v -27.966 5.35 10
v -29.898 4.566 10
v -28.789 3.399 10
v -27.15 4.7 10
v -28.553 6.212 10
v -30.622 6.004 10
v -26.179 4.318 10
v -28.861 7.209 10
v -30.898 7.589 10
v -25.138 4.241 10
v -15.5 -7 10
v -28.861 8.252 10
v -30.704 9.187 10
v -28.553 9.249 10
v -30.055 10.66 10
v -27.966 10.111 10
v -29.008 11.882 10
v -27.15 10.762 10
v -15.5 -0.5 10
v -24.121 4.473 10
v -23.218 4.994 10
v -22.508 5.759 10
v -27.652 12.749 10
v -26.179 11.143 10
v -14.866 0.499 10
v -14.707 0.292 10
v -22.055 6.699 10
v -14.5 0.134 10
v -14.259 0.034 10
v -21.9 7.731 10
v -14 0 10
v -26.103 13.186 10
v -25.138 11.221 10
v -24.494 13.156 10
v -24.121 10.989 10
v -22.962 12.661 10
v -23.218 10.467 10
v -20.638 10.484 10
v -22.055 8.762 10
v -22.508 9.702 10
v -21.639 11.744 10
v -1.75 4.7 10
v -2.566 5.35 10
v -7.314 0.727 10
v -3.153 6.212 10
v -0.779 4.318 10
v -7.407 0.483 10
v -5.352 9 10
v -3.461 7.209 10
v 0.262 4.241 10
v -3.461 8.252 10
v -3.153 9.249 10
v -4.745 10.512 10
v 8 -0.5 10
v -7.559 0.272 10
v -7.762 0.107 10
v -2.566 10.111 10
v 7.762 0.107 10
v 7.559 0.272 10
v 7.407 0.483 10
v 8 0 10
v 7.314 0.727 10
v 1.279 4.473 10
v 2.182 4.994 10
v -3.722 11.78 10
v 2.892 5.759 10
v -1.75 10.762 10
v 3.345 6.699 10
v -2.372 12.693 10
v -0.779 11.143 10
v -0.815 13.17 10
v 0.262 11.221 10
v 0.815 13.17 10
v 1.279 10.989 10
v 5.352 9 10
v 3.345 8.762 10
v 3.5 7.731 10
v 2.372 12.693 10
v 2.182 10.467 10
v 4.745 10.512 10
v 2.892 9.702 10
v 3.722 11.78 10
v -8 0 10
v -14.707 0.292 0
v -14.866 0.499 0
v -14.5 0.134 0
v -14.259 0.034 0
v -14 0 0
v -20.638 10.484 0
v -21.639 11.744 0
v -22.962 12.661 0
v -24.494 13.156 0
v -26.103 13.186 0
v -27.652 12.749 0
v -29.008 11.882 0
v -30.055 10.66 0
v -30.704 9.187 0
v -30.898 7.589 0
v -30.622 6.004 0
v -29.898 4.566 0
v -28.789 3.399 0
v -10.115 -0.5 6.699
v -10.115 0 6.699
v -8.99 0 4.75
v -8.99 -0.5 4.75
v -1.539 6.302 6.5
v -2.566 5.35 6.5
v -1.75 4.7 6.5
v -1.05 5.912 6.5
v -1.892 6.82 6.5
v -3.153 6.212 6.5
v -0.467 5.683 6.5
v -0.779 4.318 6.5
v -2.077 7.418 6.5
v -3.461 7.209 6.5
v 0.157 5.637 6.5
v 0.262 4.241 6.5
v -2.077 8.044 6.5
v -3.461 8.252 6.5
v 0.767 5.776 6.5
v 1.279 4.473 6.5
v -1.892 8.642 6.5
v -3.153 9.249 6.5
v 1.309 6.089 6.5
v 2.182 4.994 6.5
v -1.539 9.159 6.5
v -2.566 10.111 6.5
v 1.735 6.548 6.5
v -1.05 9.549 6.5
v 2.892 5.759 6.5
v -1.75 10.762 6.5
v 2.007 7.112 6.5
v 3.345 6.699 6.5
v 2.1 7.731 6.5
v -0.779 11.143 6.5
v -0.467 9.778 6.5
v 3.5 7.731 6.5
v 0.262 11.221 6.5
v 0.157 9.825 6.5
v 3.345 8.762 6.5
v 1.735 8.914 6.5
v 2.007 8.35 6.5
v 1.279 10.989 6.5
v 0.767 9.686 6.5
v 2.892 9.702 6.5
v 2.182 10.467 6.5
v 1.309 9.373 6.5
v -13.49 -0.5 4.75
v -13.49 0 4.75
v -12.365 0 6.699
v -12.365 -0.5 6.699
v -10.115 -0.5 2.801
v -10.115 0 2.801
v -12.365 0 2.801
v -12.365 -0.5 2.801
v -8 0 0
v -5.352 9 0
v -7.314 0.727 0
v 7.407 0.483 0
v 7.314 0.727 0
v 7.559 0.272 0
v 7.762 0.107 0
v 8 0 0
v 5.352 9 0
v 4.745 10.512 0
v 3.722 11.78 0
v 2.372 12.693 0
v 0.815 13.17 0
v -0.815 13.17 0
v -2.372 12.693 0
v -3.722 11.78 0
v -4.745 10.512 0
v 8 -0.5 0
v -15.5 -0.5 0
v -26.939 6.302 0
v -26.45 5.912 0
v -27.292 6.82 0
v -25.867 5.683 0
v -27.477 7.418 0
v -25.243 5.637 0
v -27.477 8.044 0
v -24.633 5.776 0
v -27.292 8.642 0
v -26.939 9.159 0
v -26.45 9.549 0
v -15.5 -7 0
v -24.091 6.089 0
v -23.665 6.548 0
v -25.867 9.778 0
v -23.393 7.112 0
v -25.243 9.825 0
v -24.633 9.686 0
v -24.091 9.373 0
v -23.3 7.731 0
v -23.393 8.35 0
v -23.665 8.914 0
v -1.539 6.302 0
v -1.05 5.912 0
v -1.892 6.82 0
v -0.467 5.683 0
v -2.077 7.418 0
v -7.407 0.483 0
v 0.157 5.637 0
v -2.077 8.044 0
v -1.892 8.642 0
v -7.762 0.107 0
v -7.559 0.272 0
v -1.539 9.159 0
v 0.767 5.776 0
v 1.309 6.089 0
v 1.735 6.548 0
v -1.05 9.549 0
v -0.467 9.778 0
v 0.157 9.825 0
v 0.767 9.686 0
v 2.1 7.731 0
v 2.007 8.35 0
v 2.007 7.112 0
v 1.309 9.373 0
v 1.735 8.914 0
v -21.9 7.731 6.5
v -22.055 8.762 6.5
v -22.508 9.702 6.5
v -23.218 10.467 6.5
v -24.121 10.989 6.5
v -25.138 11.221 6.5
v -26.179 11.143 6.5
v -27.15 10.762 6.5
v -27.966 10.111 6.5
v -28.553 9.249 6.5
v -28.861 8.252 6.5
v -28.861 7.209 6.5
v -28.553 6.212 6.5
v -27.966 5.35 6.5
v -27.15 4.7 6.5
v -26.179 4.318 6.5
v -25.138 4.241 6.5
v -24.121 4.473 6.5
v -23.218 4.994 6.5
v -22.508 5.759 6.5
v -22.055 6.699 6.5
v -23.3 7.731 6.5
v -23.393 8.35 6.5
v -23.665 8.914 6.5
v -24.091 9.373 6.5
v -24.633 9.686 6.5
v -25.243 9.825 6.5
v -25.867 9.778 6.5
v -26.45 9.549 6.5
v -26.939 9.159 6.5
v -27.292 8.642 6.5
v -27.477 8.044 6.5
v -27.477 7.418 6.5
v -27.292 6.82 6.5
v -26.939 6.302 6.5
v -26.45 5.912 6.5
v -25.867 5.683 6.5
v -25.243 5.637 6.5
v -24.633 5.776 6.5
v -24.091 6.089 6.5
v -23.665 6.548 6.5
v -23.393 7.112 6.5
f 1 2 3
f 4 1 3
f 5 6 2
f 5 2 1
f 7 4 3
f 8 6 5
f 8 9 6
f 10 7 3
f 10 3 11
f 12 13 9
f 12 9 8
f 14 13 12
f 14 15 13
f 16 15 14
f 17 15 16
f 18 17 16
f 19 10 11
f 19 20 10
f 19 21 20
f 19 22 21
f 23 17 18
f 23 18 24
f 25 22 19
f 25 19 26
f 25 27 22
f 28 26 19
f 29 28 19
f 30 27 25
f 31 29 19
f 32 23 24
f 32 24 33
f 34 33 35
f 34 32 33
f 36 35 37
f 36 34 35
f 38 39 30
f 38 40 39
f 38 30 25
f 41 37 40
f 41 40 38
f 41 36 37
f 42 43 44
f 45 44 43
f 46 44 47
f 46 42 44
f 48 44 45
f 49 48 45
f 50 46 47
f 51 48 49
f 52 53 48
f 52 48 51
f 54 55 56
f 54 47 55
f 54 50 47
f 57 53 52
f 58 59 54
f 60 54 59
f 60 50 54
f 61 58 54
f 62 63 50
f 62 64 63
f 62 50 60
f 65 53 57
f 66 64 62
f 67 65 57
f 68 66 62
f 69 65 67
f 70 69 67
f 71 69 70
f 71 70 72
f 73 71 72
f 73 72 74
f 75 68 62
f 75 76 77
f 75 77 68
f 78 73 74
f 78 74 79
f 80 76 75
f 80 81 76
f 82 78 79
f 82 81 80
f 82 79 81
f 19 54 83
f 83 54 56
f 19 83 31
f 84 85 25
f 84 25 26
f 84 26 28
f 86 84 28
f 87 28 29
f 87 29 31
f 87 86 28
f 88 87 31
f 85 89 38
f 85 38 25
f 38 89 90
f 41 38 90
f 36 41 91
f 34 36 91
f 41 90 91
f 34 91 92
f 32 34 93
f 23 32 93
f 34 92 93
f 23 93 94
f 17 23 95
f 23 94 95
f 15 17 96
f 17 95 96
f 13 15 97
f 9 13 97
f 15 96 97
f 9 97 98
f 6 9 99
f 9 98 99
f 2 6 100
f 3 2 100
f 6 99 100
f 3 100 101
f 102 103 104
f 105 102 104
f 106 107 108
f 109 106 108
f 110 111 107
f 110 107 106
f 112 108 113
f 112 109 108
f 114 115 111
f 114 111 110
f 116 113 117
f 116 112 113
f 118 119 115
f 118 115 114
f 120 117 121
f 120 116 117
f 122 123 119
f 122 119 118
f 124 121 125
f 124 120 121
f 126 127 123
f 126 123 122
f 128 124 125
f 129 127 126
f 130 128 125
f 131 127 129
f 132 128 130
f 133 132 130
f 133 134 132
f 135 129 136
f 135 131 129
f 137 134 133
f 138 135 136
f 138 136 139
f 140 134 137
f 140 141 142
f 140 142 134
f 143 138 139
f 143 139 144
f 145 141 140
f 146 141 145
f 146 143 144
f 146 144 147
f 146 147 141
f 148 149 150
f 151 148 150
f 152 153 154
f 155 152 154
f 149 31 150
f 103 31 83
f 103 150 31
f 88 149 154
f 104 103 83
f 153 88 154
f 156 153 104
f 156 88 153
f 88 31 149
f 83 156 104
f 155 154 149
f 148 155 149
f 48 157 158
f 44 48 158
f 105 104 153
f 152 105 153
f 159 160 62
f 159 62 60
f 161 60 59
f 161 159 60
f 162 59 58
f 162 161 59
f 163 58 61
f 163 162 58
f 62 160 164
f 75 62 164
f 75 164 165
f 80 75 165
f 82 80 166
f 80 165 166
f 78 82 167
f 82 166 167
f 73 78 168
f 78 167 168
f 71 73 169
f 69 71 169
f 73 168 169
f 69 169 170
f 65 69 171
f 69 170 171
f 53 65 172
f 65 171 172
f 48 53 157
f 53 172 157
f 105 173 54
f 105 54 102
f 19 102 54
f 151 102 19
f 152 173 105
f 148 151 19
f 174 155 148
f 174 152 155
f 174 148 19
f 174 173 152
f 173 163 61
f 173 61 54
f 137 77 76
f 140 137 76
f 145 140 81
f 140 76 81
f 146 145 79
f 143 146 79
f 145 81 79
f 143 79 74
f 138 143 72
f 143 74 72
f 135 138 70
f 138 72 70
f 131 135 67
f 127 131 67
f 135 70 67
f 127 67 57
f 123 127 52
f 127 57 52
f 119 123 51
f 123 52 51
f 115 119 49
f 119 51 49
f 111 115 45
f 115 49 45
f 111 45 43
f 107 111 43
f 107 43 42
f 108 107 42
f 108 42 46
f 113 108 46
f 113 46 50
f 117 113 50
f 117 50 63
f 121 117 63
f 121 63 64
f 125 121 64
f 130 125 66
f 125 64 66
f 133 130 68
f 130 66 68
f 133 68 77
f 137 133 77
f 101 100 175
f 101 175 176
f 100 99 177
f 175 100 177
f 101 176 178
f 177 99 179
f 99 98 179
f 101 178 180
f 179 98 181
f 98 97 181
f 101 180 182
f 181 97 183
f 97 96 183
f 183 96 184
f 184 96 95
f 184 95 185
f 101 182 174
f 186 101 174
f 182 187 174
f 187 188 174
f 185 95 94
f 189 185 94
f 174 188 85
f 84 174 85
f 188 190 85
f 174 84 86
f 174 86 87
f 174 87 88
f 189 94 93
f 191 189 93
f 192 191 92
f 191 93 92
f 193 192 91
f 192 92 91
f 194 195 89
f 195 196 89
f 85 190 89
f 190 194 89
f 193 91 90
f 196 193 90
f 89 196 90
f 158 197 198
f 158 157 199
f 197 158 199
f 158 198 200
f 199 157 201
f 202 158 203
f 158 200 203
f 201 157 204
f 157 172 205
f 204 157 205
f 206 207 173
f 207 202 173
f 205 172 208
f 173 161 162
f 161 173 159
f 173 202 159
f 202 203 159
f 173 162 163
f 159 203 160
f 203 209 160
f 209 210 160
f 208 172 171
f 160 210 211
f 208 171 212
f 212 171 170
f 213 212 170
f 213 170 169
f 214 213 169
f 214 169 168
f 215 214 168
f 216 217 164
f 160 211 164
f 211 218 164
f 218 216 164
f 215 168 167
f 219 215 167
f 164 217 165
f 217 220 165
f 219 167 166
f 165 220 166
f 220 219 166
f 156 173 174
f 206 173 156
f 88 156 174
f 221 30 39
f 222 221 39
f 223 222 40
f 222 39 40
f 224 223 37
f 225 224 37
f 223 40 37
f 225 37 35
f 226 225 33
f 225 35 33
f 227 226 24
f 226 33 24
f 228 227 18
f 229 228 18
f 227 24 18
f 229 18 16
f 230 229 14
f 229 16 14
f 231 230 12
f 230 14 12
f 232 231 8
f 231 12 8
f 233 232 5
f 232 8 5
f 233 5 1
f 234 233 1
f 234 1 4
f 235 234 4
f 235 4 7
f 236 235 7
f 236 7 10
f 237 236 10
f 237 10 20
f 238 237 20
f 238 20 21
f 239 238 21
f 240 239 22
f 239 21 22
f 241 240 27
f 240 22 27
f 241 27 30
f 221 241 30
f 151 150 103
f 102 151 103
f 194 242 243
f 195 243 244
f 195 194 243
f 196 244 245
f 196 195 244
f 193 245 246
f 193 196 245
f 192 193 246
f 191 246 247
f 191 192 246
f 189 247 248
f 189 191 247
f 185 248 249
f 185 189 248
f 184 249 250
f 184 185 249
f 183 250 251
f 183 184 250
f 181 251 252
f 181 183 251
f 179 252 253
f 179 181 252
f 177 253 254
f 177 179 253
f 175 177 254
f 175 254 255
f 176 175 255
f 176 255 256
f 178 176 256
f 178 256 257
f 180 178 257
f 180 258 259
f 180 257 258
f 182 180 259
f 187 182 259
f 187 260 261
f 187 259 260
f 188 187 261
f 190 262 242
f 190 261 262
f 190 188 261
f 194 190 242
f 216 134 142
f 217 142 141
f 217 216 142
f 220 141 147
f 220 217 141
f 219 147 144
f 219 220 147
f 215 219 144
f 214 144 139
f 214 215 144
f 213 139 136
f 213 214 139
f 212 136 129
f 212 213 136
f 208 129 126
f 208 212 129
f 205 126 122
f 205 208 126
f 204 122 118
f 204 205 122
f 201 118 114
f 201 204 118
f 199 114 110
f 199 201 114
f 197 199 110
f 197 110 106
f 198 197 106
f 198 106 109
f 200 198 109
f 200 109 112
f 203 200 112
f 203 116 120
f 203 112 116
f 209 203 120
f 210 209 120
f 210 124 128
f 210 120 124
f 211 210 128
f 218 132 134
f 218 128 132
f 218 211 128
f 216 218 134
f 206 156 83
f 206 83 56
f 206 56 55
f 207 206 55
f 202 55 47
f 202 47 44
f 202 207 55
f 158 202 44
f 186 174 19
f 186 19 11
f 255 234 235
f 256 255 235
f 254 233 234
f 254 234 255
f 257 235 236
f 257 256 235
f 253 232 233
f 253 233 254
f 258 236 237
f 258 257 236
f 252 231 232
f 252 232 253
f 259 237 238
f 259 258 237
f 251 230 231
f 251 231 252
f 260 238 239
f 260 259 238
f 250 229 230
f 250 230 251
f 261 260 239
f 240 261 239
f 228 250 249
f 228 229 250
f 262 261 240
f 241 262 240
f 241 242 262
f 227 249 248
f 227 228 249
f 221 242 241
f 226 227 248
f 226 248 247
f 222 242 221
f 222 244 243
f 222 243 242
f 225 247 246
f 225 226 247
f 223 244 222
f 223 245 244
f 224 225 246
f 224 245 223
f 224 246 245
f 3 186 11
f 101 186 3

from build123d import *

# Parameters (mm, degrees)
SKETCH008_R     = 2.1
PAD003_DEPTH    = 10
POCKET005_DEPTH = 3
SKETCH010_R     = 3.5
POCKET006_DEPTH = 3.5


with BuildPart() as part:
    # Sketch008 → Pad003 (new body)
    with BuildSketch(Plane.XY):
        with BuildLine():
            Line((7.31364, 0.727262), (5.35154, 9))
            ThreePointArc((5.35154, 9), (0, 13.23074), (-5.35154, 9))
            Line((-5.35154, 9), (-7.31364, 0.727262))
            ThreePointArc((-8, 0), (-7.559385, 0.271676), (-7.31364, 0.727262))
            Line((-14, 0), (-8, 0))
            ThreePointArc((-14.86632, 0.499489), (-14.500079, 0.133679), (-14, 0))
            Line((-20.638485, 10.483552), (-14.86632, 0.499489))
            ThreePointArc((-20.638485, 10.483552), (-29.007959, 11.88196), (-28.789459, 3.399278))
            Line((-15.5, -7), (-28.789459, 3.399278))
            Line((-15.5, -0.5), (-15.5, -7))
            Line((8, -0.5), (-15.5, -0.5))
            Line((8, 0), (8, -0.5))
            ThreePointArc((7.31364, 0.727262), (7.559385, 0.271676), (8, 0))
        make_face()
        with Locations((-25.4, 7.73074)):
            Circle(SKETCH008_R, mode=Mode.SUBTRACT)
        with Locations((0, 7.73074)):
            Circle(SKETCH008_R, mode=Mode.SUBTRACT)
    extrude(amount=PAD003_DEPTH)

    # Sketch009 (on Face5 of Pad003) → Pocket005 (cut)
    with BuildSketch(Plane(origin=(0, 0, 0), x_dir=(-1, 0, 0), z_dir=(0, 1, 0))):
        Polygon((12.365, 2.801443), (13.49, 4.75), (12.365, 6.698557), (10.115, 6.698557), (8.99, 4.75), (10.115, 2.801443), align=None)
    extrude(amount=-POCKET005_DEPTH, mode=Mode.SUBTRACT)

    # Sketch010 (on Face5 of Pocket005) → Pocket006 (cut)
    with BuildSketch(Plane.XY.offset(10)):
        with Locations((-25.4, 7.73074)):
            Circle(SKETCH010_R)
        with Locations((0, 7.73074)):
            Circle(SKETCH010_R)
    extrude(amount=-POCKET006_DEPTH, mode=Mode.SUBTRACT)


solid = part.part
